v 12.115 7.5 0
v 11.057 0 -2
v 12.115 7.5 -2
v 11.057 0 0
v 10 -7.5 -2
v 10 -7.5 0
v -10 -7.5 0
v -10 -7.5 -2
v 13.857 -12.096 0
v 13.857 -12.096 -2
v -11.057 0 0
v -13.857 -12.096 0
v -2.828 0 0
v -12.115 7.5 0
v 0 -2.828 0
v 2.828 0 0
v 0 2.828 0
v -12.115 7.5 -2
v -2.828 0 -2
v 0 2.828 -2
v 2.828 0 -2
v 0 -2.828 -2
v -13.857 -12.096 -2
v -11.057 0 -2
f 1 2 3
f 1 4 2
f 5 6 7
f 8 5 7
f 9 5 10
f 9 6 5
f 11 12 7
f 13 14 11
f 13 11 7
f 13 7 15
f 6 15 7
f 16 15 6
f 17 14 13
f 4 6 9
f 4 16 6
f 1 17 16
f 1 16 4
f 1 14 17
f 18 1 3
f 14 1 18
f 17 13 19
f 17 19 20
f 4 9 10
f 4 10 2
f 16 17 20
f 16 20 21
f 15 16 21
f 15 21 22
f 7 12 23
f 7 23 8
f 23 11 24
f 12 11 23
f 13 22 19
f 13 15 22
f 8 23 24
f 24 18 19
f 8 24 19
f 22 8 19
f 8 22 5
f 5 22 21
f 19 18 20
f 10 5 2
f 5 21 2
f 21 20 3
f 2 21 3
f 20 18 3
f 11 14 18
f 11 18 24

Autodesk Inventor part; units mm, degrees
ref_plane "YZ Plane" through (0, 0, 0) normal (1, 0, 0) x (0, 1, 0)
ref_plane "XZ Plane" through (0, 0, 0) normal (0, 1, 0) x (-1, 0, 0)
ref_plane "XY Plane" through (0, 0, 0) normal (0, 0, 1) x (1, 0, 0)
sketch "スケッチ1" plane through (0, 0, 0) normal (0, 0, 1) x (1, 0, 0)
  line L0 (2.8284, 0) -> (0, -2.8284)
  line L1 (0, -2.8284) -> (-2.8284, 0)
  line L2 (-2.8284, 0) -> (0, 2.8284)
  line L3 (0, 2.8284) -> (2.8284, 0)
  line L4 (-12.1149, 7.5) -> (-10, -7.5)
  line L5 (10, -7.5) -> (-10, -7.5)
  line L6 (10, -7.5) -> (12.1149, 7.5)
  line L7 (12.1149, 7.5) -> (-12.1149, 7.5)
  point P0 (0, 0)
  point P1 (0, 7.5)
  point P2 (11.0574, 0)
  dimension "d10" = 24.2298
  dimension "d11" = 20
  dimension "d12" = 15
  dimension "d13" = 4
extrude "押し出し1" add sketch "スケッチ1" against normal blind 2
sketch "スケッチ2" plane through (0, 0, 0) normal (0, 0, 1) x (1, 0, 0)
  line L0 (10, -7.5) -> (13.8567, -12.0963)
  line L1 (13.8567, -12.0963) -> (11.0574, 0)
  line L2 (-12.1149, 7.5) -> (12.1149, 7.5) projected
  line L3 (12.1149, 7.5) -> (10, -7.5) projected
  line L4 (10, -7.5) -> (-10, -7.5) projected
  line L5 (-10, -7.5) -> (-12.1149, 7.5) projected
  line L6 (0, -2.8284) -> (2.8284, 0) projected
  line L7 (2.8284, 0) -> (0, 2.8284) projected
  line L8 (0, 2.8284) -> (-2.8284, 0) projected
  line L9 (-2.8284, 0) -> (0, -2.8284) projected
  dimension "d7" = 6
  dimension "d14" = 130
extrude "押し出し2" add sketch "スケッチ2" against normal up to surface (2 mm away) contours L3 L1 L0
mirror "ミラー1" about plane through (0, 0, 0) normal (1, 0, 0) of "押し出し2"
properties part number "om_BackHolder_V2"
